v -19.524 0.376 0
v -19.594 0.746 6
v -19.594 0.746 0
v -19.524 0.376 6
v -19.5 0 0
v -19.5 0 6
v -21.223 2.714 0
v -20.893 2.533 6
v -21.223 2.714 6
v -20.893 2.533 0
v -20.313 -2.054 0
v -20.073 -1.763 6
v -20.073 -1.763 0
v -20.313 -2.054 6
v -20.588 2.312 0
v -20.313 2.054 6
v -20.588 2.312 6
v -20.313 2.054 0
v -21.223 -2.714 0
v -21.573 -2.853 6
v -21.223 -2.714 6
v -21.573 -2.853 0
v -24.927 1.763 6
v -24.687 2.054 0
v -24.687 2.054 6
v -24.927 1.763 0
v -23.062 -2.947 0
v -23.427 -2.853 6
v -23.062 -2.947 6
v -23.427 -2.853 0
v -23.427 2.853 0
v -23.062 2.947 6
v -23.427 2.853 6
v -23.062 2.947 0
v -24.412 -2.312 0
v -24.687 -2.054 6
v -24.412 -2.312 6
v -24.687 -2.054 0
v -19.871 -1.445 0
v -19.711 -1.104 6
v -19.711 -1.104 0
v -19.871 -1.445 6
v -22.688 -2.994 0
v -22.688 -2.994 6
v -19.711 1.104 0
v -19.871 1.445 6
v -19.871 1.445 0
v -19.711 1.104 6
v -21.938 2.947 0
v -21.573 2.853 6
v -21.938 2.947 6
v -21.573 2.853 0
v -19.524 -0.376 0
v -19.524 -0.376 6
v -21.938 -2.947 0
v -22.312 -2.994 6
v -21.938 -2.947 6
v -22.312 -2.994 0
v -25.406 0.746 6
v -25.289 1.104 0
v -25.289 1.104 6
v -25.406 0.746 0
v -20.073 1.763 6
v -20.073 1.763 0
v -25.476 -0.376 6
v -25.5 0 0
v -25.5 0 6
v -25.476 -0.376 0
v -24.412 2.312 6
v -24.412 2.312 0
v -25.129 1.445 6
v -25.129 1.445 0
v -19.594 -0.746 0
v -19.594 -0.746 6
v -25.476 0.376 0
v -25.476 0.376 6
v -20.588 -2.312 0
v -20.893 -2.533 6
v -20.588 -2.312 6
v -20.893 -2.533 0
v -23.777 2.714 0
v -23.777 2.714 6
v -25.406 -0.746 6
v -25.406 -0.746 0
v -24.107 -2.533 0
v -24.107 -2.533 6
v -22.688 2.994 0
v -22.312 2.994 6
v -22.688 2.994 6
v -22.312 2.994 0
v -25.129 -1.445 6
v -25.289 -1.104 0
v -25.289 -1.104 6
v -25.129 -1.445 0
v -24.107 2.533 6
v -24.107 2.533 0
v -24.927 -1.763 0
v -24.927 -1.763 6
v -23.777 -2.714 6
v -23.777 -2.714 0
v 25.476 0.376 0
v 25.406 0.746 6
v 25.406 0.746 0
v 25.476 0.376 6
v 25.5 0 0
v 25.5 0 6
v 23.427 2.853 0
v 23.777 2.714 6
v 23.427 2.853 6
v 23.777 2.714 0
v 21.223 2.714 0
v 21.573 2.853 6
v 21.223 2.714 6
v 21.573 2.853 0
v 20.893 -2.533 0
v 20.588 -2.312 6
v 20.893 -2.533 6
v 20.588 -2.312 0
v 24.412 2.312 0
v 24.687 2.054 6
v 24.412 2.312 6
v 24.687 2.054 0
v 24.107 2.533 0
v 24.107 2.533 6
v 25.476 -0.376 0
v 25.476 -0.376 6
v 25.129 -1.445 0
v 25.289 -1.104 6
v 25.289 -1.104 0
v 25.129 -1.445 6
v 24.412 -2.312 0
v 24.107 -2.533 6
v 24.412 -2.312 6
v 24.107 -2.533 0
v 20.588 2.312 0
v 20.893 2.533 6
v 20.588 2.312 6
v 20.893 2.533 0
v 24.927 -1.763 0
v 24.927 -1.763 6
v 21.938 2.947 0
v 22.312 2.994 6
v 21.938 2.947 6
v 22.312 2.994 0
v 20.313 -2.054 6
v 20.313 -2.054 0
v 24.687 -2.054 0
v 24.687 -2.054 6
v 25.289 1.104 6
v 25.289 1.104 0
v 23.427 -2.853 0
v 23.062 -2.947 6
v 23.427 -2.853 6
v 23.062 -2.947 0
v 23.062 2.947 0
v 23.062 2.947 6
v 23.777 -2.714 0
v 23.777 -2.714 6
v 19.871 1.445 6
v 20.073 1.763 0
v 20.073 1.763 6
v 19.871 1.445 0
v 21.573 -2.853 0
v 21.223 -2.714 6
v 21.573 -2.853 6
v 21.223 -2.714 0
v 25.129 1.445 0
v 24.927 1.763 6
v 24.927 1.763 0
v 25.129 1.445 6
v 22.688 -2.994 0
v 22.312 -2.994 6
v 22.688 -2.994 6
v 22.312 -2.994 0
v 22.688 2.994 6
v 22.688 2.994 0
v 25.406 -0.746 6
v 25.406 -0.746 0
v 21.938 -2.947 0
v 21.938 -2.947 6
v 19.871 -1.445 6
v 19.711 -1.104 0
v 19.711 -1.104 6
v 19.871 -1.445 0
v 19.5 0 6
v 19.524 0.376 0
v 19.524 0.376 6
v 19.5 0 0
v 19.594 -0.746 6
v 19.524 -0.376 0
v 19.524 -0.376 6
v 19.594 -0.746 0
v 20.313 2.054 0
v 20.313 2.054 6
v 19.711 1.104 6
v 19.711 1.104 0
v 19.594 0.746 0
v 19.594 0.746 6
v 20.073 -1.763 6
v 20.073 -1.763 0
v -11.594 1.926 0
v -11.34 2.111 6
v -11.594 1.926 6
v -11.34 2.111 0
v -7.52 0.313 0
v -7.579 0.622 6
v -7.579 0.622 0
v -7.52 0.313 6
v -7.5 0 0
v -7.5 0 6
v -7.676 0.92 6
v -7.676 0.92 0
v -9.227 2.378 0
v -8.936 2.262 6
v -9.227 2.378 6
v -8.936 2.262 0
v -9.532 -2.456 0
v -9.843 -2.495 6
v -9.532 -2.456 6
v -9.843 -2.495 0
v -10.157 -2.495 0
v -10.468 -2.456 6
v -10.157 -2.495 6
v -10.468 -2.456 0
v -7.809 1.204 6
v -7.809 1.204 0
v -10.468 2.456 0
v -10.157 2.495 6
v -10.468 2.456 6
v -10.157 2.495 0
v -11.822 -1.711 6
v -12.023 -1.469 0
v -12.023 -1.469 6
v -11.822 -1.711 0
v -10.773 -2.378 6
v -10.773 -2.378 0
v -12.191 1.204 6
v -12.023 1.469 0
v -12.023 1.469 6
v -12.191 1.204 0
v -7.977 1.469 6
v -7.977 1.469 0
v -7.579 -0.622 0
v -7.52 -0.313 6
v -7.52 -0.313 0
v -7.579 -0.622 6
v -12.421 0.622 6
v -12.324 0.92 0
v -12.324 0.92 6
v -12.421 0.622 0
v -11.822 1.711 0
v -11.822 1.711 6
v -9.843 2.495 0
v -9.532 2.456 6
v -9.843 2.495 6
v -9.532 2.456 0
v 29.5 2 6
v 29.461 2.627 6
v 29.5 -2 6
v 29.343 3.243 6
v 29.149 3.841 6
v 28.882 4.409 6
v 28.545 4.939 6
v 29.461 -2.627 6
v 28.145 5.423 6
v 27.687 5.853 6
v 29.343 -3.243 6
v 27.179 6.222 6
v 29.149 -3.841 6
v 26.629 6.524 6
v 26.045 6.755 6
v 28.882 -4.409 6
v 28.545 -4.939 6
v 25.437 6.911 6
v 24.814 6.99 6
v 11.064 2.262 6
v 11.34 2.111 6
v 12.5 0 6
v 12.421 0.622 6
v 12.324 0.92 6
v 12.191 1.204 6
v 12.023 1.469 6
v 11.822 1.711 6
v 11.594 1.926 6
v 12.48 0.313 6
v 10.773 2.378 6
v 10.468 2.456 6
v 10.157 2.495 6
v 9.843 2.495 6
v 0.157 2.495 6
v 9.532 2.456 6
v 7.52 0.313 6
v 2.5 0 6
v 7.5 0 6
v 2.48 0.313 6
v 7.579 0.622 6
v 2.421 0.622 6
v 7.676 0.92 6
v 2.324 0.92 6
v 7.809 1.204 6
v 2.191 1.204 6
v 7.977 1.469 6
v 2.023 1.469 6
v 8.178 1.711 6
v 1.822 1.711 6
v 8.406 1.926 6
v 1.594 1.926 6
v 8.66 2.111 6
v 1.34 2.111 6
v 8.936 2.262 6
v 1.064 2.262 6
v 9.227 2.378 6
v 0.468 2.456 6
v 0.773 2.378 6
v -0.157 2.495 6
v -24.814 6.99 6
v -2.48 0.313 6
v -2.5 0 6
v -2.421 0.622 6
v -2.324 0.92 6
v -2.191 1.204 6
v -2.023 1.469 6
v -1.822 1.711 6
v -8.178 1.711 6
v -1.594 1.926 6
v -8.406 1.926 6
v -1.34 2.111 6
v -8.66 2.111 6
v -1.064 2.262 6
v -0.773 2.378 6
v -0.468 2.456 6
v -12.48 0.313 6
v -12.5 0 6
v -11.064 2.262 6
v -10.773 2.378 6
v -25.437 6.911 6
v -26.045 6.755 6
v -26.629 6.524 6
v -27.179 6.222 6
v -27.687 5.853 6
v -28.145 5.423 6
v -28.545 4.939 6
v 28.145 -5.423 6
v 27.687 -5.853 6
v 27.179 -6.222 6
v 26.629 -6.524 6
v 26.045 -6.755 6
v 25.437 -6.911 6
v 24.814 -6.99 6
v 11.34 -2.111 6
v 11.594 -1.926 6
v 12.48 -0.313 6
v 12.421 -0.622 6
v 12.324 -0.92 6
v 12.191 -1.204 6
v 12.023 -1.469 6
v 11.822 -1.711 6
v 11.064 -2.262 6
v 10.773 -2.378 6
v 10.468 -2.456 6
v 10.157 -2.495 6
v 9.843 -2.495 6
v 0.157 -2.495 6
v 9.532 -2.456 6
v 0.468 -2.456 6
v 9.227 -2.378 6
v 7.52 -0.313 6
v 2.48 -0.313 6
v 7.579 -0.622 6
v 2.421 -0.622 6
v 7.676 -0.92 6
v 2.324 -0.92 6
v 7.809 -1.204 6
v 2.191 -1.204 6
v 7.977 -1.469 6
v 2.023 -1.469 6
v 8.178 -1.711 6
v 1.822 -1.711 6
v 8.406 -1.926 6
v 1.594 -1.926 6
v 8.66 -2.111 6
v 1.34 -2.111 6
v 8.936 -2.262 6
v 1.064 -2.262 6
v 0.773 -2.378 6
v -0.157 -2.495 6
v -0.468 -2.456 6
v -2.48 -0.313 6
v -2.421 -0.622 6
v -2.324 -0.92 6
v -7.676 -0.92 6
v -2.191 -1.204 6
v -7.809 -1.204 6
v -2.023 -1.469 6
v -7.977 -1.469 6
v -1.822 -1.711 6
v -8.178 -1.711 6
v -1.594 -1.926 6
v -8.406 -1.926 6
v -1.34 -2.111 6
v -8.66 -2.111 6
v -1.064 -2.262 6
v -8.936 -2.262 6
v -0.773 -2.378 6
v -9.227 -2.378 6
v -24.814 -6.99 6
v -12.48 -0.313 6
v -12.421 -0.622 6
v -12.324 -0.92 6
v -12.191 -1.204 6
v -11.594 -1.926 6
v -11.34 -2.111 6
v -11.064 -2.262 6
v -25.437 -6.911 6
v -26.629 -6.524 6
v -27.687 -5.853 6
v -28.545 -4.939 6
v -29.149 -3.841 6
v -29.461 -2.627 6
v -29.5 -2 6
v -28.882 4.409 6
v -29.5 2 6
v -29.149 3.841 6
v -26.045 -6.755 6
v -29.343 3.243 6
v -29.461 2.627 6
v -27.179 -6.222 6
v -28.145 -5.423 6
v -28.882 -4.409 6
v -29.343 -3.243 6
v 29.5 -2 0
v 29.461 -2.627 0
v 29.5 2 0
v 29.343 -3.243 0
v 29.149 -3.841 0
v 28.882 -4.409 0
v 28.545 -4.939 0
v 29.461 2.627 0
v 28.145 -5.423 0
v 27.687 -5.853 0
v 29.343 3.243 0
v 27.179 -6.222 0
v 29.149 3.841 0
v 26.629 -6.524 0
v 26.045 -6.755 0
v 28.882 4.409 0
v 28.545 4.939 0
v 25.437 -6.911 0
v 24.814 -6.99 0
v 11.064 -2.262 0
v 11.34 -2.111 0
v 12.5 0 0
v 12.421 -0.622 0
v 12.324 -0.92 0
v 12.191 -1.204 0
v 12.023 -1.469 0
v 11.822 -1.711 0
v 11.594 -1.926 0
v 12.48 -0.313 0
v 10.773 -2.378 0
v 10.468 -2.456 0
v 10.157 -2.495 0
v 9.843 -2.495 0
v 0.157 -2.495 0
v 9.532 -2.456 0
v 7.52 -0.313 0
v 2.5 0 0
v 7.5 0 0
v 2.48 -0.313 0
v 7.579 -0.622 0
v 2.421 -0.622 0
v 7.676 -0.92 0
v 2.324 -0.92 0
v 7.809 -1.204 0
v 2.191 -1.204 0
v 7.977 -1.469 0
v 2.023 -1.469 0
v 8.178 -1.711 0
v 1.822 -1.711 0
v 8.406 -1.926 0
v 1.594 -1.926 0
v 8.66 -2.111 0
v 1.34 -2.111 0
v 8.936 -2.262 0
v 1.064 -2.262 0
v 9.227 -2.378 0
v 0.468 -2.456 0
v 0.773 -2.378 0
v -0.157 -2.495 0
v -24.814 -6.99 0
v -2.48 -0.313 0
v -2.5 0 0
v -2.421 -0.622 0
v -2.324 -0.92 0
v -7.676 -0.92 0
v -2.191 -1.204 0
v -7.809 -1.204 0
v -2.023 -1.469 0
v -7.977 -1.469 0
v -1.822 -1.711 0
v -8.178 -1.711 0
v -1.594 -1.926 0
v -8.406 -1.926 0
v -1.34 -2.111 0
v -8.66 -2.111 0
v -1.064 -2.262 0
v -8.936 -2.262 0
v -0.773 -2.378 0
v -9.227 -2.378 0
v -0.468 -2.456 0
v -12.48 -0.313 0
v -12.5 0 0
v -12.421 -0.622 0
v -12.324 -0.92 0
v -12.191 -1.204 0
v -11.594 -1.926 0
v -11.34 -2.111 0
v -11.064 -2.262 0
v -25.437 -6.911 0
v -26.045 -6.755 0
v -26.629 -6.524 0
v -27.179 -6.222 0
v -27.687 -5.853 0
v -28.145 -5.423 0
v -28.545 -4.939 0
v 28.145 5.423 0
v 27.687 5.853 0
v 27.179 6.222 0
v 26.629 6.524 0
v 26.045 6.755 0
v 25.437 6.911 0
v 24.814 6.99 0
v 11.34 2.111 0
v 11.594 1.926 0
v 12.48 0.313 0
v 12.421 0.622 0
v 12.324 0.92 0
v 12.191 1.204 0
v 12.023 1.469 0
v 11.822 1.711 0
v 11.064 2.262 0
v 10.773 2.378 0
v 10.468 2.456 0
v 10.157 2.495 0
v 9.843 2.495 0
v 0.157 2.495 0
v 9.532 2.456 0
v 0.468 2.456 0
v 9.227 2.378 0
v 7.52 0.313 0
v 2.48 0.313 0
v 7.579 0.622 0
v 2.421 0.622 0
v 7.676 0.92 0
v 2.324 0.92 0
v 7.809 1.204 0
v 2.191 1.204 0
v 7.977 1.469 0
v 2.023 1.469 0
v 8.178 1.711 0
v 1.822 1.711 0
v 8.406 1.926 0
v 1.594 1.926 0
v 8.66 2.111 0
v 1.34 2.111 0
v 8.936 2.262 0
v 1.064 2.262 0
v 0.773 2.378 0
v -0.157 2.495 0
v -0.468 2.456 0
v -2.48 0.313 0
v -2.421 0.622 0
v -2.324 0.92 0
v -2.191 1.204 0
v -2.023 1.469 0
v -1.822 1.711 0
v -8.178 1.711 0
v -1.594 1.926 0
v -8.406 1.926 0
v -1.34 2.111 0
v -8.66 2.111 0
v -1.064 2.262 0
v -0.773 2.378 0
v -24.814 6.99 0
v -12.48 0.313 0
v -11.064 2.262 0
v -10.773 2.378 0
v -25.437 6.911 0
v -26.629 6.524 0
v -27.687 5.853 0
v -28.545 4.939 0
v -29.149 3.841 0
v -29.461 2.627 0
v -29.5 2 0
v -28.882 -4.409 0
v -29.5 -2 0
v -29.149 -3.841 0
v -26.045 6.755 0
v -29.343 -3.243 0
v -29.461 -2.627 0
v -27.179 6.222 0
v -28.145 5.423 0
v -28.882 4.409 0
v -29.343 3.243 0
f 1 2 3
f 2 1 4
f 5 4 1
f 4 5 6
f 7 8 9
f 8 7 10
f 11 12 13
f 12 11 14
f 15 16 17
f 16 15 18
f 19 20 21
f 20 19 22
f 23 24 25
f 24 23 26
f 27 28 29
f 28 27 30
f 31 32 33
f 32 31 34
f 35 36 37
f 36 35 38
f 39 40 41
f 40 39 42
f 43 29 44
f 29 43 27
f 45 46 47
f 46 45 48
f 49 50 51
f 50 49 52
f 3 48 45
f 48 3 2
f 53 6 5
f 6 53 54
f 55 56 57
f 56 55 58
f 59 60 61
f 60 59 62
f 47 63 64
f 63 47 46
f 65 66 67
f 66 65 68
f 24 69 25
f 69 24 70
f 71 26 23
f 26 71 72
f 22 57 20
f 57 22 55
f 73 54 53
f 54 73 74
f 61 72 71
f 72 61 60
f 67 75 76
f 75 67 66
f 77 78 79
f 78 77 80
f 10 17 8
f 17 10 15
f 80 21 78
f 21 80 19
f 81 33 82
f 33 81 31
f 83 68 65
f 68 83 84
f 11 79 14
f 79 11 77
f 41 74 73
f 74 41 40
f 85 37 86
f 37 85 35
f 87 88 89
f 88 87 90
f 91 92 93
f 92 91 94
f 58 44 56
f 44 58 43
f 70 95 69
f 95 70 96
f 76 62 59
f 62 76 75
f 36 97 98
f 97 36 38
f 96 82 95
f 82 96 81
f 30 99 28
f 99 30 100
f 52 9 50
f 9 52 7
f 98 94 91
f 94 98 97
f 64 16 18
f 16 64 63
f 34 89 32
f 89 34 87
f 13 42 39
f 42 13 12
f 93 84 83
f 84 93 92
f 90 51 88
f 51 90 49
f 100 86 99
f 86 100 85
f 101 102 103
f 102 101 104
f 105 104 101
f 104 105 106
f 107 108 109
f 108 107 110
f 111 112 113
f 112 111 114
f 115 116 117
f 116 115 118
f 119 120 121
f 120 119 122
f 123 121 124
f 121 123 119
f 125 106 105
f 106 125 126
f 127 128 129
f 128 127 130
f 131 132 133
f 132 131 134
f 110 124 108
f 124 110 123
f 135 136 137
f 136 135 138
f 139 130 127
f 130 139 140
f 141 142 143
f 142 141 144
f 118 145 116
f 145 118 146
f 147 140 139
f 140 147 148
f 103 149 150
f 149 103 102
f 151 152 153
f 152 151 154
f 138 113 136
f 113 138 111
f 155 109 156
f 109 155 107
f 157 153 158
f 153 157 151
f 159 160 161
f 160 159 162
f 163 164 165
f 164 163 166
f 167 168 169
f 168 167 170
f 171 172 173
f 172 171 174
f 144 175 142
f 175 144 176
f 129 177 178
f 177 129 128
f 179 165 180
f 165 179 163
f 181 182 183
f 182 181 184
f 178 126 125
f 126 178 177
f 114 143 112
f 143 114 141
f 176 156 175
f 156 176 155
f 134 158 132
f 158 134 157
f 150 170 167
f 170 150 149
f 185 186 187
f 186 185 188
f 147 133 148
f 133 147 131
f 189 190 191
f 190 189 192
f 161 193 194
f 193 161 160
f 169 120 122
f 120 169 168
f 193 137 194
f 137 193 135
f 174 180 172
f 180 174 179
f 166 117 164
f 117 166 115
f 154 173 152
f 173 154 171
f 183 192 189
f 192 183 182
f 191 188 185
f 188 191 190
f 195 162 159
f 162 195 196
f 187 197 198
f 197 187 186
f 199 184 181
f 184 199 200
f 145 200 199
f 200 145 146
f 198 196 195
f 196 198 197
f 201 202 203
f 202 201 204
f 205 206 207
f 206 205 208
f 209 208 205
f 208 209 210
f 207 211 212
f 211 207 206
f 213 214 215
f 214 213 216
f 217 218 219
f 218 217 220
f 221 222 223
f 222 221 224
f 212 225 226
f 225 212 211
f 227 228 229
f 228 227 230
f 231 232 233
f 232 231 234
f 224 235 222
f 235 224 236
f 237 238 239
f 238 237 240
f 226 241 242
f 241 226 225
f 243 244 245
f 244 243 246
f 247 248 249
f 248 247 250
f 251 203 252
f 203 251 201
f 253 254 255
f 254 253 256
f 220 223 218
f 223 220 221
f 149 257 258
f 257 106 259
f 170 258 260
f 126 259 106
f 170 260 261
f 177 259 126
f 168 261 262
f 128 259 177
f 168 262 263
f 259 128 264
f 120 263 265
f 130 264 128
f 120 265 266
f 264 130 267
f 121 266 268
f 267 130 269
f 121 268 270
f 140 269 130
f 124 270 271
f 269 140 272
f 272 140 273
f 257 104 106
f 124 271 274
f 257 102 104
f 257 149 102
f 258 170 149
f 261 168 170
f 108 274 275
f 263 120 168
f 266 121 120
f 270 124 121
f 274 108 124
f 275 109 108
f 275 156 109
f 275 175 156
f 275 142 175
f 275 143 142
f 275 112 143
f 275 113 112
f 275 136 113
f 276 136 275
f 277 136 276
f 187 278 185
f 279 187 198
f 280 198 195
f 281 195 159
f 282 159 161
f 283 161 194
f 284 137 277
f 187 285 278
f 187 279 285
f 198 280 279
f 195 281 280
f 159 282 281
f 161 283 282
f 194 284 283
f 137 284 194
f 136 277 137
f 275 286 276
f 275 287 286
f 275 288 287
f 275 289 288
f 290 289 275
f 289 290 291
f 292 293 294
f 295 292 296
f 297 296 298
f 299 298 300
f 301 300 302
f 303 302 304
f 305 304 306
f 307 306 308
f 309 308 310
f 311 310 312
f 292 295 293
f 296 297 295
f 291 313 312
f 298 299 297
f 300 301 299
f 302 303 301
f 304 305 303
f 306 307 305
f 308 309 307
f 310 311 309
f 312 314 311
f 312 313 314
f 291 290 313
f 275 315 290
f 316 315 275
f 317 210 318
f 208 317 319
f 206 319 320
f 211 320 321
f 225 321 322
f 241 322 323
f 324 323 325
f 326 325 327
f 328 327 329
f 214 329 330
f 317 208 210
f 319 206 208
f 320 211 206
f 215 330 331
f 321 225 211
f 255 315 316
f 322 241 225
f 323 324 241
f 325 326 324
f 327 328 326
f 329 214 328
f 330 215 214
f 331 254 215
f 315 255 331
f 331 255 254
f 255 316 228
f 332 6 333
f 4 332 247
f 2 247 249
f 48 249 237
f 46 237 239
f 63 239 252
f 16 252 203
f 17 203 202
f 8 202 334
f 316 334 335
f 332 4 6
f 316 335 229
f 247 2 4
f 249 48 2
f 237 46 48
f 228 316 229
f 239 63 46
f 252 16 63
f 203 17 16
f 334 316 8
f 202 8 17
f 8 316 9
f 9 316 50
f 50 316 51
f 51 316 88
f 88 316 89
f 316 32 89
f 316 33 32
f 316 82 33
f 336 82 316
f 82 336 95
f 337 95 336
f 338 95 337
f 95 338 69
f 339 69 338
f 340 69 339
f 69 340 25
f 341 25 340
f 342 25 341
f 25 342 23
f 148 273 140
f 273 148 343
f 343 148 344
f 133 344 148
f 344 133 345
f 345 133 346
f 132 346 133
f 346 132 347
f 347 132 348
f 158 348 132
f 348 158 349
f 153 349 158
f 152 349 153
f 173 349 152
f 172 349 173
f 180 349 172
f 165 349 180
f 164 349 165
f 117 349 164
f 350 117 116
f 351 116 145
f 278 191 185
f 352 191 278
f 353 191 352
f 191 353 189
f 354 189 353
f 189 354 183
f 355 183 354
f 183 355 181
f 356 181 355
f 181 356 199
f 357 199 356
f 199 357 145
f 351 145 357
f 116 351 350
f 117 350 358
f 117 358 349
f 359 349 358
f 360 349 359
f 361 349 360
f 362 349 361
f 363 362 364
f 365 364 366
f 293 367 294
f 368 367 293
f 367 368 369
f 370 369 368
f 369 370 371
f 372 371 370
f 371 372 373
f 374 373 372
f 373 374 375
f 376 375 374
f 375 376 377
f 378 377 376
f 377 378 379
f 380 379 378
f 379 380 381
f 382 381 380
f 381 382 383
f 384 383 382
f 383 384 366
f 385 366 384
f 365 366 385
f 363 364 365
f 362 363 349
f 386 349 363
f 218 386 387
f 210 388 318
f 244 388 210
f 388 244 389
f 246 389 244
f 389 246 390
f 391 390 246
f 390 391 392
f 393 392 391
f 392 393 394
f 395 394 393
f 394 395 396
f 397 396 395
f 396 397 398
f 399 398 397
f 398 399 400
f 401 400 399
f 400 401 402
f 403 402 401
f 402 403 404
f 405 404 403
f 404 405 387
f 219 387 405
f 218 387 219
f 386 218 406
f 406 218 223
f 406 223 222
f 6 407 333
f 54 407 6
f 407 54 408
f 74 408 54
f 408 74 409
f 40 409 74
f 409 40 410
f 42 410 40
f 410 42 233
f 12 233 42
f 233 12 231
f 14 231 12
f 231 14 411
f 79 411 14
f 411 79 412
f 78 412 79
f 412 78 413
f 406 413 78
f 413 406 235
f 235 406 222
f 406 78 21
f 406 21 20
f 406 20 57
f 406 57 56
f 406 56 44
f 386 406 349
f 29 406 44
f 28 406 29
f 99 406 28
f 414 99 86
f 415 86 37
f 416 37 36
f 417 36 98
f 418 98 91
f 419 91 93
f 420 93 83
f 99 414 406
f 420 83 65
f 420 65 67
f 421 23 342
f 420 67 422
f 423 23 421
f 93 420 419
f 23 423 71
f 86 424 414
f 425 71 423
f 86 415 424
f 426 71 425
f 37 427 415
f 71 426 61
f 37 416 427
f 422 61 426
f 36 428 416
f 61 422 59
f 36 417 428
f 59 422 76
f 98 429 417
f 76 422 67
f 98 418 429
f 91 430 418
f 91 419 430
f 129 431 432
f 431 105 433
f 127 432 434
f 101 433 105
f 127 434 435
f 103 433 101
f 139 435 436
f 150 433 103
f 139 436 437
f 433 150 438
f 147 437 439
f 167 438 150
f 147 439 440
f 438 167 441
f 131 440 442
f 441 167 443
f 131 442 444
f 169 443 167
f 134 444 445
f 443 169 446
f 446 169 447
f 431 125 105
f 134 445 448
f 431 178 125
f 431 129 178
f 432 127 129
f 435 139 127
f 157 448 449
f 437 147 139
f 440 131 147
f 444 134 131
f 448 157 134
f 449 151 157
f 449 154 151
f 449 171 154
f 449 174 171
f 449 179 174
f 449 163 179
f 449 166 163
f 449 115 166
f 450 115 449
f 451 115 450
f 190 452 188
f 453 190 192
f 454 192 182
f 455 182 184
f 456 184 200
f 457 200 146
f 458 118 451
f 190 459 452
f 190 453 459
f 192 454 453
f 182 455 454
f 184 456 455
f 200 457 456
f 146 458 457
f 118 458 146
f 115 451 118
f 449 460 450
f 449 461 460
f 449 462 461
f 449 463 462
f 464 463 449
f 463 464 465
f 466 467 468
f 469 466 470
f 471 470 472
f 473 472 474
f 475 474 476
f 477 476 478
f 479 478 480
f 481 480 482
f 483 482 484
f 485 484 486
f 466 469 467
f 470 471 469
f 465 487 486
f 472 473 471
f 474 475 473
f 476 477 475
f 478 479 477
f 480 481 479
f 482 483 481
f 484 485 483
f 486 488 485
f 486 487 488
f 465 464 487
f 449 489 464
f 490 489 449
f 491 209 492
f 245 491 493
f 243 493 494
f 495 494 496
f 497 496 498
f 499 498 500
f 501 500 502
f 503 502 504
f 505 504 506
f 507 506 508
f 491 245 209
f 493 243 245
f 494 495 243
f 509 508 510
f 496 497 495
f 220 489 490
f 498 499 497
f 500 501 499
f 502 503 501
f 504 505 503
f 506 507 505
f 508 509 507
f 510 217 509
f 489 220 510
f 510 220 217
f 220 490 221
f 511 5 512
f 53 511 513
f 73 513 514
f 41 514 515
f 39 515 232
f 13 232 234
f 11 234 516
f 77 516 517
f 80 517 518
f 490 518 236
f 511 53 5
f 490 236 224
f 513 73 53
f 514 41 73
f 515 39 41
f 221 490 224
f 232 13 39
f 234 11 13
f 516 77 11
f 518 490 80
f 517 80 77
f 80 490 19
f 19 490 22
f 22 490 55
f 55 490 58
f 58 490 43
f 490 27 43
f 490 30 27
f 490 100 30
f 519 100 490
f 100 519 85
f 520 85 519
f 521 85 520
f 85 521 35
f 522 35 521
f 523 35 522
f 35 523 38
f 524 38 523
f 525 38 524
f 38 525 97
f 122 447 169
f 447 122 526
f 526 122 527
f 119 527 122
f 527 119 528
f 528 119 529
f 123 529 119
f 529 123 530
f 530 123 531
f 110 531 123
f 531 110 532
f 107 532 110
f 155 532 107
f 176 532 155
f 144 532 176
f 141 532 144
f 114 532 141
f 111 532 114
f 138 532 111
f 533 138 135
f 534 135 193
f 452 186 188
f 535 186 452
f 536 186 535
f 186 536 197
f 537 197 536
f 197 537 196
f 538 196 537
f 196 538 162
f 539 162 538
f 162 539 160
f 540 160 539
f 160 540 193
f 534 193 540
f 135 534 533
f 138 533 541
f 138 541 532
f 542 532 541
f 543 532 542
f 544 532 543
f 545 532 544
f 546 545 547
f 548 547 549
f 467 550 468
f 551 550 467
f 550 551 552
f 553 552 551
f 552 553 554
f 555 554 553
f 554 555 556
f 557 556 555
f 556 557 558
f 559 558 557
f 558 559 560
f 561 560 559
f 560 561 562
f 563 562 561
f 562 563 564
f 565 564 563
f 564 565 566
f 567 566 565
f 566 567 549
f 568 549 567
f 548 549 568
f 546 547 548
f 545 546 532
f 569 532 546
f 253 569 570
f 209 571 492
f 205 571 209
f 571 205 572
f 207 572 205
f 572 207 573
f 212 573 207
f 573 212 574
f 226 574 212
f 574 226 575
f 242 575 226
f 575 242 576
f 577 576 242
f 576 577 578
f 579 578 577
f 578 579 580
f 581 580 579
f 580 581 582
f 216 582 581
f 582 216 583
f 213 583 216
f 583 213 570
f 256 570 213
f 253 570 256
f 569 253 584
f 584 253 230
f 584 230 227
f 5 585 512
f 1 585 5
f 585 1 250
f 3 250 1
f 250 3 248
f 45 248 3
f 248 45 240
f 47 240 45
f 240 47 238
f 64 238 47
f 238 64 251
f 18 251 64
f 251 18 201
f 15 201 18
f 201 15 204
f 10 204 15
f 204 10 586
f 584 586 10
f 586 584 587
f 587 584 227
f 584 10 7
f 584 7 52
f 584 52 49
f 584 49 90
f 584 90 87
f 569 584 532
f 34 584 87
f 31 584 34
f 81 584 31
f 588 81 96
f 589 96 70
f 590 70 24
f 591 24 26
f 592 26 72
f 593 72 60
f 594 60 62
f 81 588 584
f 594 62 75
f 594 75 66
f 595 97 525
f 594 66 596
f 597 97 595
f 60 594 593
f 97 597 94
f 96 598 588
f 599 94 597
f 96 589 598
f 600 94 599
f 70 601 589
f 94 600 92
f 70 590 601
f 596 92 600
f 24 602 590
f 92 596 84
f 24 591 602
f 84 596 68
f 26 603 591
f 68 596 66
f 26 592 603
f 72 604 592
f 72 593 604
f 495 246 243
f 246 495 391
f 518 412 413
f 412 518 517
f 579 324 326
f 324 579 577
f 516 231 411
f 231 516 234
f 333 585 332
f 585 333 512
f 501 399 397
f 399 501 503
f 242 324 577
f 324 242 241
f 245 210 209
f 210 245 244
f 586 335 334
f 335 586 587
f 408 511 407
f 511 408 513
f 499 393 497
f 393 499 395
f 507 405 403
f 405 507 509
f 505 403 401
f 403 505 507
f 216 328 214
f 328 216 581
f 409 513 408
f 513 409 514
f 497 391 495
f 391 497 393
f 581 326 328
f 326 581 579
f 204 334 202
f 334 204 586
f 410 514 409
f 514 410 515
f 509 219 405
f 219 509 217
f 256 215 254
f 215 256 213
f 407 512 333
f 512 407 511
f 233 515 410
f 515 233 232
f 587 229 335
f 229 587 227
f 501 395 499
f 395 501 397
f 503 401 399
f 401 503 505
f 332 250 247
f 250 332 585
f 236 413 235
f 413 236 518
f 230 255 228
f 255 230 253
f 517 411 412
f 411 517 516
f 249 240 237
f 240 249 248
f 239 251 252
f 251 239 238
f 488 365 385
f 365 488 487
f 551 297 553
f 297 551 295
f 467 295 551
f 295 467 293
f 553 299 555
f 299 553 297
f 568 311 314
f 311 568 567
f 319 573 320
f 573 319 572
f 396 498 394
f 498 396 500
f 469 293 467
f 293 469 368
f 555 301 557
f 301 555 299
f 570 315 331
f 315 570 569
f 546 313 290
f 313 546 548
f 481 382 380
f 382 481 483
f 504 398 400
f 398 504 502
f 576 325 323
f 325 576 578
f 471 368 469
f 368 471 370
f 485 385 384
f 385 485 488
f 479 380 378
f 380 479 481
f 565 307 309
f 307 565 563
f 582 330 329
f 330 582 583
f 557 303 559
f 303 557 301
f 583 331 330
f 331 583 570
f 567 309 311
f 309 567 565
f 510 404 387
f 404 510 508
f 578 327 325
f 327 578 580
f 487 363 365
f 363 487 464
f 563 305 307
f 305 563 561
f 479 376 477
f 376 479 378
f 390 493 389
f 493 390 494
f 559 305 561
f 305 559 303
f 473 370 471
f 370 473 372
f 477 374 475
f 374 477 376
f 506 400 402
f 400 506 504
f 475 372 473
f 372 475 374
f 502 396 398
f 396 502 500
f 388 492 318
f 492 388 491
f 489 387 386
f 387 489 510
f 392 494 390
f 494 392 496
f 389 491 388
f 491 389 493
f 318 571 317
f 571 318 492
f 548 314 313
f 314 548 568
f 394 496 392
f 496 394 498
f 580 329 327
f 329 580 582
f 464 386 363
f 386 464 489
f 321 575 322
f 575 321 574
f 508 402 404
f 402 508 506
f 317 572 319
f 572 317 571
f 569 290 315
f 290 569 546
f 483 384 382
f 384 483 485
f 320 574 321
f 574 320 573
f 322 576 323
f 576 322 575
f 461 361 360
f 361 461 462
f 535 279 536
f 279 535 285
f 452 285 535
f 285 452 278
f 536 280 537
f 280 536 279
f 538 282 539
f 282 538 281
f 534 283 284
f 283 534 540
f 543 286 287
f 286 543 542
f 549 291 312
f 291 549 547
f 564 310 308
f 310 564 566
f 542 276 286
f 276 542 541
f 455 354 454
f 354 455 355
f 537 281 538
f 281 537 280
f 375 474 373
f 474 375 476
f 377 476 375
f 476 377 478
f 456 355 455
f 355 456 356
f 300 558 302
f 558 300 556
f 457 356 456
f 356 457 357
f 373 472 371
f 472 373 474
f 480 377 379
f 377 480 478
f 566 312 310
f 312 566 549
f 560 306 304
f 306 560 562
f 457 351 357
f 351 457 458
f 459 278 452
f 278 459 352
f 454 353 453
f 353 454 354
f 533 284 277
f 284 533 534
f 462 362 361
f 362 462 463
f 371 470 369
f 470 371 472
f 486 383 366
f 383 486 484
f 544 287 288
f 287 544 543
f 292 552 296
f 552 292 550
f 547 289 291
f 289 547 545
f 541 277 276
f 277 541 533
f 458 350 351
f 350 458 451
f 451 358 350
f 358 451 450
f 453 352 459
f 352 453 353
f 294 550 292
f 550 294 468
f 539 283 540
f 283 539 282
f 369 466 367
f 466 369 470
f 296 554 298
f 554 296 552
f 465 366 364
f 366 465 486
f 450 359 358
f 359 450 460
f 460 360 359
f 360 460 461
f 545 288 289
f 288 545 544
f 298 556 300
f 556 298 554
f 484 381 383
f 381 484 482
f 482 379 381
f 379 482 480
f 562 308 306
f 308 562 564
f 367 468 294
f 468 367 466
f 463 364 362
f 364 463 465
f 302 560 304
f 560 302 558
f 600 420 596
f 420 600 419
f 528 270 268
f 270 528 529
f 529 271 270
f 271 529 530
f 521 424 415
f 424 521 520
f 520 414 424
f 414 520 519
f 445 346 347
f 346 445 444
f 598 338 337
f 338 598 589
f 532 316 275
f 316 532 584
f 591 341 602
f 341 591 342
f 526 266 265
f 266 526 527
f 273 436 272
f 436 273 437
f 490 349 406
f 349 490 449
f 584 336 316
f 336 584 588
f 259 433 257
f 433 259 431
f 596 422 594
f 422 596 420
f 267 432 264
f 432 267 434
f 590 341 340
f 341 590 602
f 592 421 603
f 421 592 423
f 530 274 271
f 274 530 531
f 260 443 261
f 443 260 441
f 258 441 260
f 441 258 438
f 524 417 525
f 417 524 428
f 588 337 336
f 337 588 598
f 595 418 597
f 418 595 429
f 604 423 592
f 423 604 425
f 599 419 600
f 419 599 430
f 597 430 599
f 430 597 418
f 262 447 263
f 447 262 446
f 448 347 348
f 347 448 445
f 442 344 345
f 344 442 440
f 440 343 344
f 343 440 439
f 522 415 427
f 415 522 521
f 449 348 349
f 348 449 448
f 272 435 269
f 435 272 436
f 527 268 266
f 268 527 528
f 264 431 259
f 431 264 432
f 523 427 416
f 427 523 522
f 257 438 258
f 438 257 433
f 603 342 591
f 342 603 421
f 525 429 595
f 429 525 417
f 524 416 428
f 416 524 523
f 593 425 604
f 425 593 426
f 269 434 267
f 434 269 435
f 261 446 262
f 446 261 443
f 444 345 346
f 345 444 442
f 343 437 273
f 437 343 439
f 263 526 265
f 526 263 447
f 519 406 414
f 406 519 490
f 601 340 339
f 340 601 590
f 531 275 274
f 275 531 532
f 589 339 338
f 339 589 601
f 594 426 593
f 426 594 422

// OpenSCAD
$fn = 50;


difference() {
	union() {
		hull() {
			translate(v = [-24.5000000000, 2.0000000000, 0]) {
				cylinder(h = 6, r = 5);
			}
			translate(v = [24.5000000000, 2.0000000000, 0]) {
				cylinder(h = 6, r = 5);
			}
			translate(v = [-24.5000000000, -2.0000000000, 0]) {
				cylinder(h = 6, r = 5);
			}
			translate(v = [24.5000000000, -2.0000000000, 0]) {
				cylinder(h = 6, r = 5);
			}
		}
	}
	union() {
		#translate(v = [-22.5000000000, 0.0000000000, 0]) {
			cylinder(h = 6, r = 3.0000000000);
		}
		#translate(v = [22.5000000000, 0.0000000000, 0]) {
			cylinder(h = 6, r = 3.0000000000);
		}
		#translate(v = [-22.5000000000, 0.0000000000, -100.0000000000]) {
			cylinder(h = 200, r = 3.0000000000);
		}
		#translate(v = [-22.5000000000, 0.0000000000, -100.0000000000]) {
			cylinder(h = 200, r = 3.0000000000);
		}
		#translate(v = [22.5000000000, 0.0000000000, -100.0000000000]) {
			cylinder(h = 200, r = 3.0000000000);
		}
		#translate(v = [22.5000000000, 0.0000000000, -100.0000000000]) {
			cylinder(h = 200, r = 3.0000000000);
		}
		#translate(v = [-22.5000000000, 0.0000000000, 0]) {
			cylinder(h = 6, r = 1.5000000000);
		}
		#translate(v = [22.5000000000, 0.0000000000, 0]) {
			cylinder(h = 6, r = 1.5000000000);
		}
		#translate(v = [-22.5000000000, 0.0000000000, 0]) {
			cylinder(h = 6, r = 1.5000000000);
		}
		#translate(v = [22.5000000000, 0.0000000000, 0]) {
			cylinder(h = 6, r = 1.5000000000);
		}
		#translate(v = [-22.5000000000, 0.0000000000, 0]) {
			cylinder(h = 6, r = 1.5000000000);
		}
		#translate(v = [22.5000000000, 0.0000000000, 0]) {
			cylinder(h = 6, r = 1.5000000000);
		}
		#translate(v = [-10.0000000000, 0, 0]) {
			cylinder(h = 6, r = 2.5000000000);
		}
		#cylinder(h = 6, r = 2.5000000000);
		#translate(v = [10.0000000000, 0, 0]) {
			cylinder(h = 6, r = 2.5000000000);
		}
	}
}
